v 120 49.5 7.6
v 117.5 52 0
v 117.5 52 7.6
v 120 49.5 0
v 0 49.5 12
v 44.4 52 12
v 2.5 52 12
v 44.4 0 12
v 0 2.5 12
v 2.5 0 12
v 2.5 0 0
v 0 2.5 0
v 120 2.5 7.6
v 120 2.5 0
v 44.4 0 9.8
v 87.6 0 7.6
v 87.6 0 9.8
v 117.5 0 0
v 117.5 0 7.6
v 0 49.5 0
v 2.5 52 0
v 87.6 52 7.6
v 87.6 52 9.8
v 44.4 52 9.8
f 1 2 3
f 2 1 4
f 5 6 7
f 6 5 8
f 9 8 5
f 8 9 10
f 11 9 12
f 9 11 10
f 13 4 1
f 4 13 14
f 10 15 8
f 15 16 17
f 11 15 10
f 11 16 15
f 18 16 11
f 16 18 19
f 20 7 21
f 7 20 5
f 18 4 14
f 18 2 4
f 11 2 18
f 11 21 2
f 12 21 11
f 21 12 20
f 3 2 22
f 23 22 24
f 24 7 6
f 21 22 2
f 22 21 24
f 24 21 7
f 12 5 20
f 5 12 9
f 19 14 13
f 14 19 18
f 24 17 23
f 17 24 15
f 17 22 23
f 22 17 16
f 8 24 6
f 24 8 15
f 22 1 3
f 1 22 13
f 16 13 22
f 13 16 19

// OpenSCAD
$fn = 32;

// ----------------------------------------------------------------------
// Stepped bar: twostep, 120 x 52 x 12/7.6 mm
// ----------------------------------------------------------------------

// --- parameters (mm) ---
bar_l = 120;              // bar length, X
bar_w = 52;               // bar width, Y
plate_t = 12;             // thickness of the thick zone, Z
thin_t = 7.6;             // thickness of the thin zone
corner_c = 2.5;           // corner chamfer of the bar
step_cut = 4.4;           // material removed from the thin zone
stair1_x = 44.4;          // position of the first stair
stair2_x = 87.6;          // position of the second stair
mid_t = 9.8;              // thickness of the middle zone
depth_1 = 2.2;            // depth of cut 1 from the top face
depth_2 = 4.4;            // depth of cut 2 from the top face
fit_tol = 0.05;           // declared fit tolerance (prompt contract)
free_tol = 0.3;           // declared free tolerance (prompt contract)

profile = [[2.5, 0], [117.5, 0], [120, 2.5], [120, 49.5], [117.5, 52], [2.5, 52], [0, 49.5], [0, 2.5]];  // primary outline, 8 points, counter clockwise
void_1 = [[44.4, -1], [87.6, -1], [87.6, 53], [44.4, 53]];  // first stair, 4 points
void_2 = [[87.6, -1], [121, -1], [121, 53], [87.6, 53]];  // second stair, 4 points

// --- the one profile operation ---
difference() {
  linear_extrude(height = plate_t) polygon(points = profile);
  translate([0, 0, plate_t - depth_1])
    linear_extrude(height = depth_1 + 1) polygon(points = void_1);
  translate([0, 0, plate_t - depth_2])
    linear_extrude(height = depth_2 + 1) polygon(points = void_2);
}
